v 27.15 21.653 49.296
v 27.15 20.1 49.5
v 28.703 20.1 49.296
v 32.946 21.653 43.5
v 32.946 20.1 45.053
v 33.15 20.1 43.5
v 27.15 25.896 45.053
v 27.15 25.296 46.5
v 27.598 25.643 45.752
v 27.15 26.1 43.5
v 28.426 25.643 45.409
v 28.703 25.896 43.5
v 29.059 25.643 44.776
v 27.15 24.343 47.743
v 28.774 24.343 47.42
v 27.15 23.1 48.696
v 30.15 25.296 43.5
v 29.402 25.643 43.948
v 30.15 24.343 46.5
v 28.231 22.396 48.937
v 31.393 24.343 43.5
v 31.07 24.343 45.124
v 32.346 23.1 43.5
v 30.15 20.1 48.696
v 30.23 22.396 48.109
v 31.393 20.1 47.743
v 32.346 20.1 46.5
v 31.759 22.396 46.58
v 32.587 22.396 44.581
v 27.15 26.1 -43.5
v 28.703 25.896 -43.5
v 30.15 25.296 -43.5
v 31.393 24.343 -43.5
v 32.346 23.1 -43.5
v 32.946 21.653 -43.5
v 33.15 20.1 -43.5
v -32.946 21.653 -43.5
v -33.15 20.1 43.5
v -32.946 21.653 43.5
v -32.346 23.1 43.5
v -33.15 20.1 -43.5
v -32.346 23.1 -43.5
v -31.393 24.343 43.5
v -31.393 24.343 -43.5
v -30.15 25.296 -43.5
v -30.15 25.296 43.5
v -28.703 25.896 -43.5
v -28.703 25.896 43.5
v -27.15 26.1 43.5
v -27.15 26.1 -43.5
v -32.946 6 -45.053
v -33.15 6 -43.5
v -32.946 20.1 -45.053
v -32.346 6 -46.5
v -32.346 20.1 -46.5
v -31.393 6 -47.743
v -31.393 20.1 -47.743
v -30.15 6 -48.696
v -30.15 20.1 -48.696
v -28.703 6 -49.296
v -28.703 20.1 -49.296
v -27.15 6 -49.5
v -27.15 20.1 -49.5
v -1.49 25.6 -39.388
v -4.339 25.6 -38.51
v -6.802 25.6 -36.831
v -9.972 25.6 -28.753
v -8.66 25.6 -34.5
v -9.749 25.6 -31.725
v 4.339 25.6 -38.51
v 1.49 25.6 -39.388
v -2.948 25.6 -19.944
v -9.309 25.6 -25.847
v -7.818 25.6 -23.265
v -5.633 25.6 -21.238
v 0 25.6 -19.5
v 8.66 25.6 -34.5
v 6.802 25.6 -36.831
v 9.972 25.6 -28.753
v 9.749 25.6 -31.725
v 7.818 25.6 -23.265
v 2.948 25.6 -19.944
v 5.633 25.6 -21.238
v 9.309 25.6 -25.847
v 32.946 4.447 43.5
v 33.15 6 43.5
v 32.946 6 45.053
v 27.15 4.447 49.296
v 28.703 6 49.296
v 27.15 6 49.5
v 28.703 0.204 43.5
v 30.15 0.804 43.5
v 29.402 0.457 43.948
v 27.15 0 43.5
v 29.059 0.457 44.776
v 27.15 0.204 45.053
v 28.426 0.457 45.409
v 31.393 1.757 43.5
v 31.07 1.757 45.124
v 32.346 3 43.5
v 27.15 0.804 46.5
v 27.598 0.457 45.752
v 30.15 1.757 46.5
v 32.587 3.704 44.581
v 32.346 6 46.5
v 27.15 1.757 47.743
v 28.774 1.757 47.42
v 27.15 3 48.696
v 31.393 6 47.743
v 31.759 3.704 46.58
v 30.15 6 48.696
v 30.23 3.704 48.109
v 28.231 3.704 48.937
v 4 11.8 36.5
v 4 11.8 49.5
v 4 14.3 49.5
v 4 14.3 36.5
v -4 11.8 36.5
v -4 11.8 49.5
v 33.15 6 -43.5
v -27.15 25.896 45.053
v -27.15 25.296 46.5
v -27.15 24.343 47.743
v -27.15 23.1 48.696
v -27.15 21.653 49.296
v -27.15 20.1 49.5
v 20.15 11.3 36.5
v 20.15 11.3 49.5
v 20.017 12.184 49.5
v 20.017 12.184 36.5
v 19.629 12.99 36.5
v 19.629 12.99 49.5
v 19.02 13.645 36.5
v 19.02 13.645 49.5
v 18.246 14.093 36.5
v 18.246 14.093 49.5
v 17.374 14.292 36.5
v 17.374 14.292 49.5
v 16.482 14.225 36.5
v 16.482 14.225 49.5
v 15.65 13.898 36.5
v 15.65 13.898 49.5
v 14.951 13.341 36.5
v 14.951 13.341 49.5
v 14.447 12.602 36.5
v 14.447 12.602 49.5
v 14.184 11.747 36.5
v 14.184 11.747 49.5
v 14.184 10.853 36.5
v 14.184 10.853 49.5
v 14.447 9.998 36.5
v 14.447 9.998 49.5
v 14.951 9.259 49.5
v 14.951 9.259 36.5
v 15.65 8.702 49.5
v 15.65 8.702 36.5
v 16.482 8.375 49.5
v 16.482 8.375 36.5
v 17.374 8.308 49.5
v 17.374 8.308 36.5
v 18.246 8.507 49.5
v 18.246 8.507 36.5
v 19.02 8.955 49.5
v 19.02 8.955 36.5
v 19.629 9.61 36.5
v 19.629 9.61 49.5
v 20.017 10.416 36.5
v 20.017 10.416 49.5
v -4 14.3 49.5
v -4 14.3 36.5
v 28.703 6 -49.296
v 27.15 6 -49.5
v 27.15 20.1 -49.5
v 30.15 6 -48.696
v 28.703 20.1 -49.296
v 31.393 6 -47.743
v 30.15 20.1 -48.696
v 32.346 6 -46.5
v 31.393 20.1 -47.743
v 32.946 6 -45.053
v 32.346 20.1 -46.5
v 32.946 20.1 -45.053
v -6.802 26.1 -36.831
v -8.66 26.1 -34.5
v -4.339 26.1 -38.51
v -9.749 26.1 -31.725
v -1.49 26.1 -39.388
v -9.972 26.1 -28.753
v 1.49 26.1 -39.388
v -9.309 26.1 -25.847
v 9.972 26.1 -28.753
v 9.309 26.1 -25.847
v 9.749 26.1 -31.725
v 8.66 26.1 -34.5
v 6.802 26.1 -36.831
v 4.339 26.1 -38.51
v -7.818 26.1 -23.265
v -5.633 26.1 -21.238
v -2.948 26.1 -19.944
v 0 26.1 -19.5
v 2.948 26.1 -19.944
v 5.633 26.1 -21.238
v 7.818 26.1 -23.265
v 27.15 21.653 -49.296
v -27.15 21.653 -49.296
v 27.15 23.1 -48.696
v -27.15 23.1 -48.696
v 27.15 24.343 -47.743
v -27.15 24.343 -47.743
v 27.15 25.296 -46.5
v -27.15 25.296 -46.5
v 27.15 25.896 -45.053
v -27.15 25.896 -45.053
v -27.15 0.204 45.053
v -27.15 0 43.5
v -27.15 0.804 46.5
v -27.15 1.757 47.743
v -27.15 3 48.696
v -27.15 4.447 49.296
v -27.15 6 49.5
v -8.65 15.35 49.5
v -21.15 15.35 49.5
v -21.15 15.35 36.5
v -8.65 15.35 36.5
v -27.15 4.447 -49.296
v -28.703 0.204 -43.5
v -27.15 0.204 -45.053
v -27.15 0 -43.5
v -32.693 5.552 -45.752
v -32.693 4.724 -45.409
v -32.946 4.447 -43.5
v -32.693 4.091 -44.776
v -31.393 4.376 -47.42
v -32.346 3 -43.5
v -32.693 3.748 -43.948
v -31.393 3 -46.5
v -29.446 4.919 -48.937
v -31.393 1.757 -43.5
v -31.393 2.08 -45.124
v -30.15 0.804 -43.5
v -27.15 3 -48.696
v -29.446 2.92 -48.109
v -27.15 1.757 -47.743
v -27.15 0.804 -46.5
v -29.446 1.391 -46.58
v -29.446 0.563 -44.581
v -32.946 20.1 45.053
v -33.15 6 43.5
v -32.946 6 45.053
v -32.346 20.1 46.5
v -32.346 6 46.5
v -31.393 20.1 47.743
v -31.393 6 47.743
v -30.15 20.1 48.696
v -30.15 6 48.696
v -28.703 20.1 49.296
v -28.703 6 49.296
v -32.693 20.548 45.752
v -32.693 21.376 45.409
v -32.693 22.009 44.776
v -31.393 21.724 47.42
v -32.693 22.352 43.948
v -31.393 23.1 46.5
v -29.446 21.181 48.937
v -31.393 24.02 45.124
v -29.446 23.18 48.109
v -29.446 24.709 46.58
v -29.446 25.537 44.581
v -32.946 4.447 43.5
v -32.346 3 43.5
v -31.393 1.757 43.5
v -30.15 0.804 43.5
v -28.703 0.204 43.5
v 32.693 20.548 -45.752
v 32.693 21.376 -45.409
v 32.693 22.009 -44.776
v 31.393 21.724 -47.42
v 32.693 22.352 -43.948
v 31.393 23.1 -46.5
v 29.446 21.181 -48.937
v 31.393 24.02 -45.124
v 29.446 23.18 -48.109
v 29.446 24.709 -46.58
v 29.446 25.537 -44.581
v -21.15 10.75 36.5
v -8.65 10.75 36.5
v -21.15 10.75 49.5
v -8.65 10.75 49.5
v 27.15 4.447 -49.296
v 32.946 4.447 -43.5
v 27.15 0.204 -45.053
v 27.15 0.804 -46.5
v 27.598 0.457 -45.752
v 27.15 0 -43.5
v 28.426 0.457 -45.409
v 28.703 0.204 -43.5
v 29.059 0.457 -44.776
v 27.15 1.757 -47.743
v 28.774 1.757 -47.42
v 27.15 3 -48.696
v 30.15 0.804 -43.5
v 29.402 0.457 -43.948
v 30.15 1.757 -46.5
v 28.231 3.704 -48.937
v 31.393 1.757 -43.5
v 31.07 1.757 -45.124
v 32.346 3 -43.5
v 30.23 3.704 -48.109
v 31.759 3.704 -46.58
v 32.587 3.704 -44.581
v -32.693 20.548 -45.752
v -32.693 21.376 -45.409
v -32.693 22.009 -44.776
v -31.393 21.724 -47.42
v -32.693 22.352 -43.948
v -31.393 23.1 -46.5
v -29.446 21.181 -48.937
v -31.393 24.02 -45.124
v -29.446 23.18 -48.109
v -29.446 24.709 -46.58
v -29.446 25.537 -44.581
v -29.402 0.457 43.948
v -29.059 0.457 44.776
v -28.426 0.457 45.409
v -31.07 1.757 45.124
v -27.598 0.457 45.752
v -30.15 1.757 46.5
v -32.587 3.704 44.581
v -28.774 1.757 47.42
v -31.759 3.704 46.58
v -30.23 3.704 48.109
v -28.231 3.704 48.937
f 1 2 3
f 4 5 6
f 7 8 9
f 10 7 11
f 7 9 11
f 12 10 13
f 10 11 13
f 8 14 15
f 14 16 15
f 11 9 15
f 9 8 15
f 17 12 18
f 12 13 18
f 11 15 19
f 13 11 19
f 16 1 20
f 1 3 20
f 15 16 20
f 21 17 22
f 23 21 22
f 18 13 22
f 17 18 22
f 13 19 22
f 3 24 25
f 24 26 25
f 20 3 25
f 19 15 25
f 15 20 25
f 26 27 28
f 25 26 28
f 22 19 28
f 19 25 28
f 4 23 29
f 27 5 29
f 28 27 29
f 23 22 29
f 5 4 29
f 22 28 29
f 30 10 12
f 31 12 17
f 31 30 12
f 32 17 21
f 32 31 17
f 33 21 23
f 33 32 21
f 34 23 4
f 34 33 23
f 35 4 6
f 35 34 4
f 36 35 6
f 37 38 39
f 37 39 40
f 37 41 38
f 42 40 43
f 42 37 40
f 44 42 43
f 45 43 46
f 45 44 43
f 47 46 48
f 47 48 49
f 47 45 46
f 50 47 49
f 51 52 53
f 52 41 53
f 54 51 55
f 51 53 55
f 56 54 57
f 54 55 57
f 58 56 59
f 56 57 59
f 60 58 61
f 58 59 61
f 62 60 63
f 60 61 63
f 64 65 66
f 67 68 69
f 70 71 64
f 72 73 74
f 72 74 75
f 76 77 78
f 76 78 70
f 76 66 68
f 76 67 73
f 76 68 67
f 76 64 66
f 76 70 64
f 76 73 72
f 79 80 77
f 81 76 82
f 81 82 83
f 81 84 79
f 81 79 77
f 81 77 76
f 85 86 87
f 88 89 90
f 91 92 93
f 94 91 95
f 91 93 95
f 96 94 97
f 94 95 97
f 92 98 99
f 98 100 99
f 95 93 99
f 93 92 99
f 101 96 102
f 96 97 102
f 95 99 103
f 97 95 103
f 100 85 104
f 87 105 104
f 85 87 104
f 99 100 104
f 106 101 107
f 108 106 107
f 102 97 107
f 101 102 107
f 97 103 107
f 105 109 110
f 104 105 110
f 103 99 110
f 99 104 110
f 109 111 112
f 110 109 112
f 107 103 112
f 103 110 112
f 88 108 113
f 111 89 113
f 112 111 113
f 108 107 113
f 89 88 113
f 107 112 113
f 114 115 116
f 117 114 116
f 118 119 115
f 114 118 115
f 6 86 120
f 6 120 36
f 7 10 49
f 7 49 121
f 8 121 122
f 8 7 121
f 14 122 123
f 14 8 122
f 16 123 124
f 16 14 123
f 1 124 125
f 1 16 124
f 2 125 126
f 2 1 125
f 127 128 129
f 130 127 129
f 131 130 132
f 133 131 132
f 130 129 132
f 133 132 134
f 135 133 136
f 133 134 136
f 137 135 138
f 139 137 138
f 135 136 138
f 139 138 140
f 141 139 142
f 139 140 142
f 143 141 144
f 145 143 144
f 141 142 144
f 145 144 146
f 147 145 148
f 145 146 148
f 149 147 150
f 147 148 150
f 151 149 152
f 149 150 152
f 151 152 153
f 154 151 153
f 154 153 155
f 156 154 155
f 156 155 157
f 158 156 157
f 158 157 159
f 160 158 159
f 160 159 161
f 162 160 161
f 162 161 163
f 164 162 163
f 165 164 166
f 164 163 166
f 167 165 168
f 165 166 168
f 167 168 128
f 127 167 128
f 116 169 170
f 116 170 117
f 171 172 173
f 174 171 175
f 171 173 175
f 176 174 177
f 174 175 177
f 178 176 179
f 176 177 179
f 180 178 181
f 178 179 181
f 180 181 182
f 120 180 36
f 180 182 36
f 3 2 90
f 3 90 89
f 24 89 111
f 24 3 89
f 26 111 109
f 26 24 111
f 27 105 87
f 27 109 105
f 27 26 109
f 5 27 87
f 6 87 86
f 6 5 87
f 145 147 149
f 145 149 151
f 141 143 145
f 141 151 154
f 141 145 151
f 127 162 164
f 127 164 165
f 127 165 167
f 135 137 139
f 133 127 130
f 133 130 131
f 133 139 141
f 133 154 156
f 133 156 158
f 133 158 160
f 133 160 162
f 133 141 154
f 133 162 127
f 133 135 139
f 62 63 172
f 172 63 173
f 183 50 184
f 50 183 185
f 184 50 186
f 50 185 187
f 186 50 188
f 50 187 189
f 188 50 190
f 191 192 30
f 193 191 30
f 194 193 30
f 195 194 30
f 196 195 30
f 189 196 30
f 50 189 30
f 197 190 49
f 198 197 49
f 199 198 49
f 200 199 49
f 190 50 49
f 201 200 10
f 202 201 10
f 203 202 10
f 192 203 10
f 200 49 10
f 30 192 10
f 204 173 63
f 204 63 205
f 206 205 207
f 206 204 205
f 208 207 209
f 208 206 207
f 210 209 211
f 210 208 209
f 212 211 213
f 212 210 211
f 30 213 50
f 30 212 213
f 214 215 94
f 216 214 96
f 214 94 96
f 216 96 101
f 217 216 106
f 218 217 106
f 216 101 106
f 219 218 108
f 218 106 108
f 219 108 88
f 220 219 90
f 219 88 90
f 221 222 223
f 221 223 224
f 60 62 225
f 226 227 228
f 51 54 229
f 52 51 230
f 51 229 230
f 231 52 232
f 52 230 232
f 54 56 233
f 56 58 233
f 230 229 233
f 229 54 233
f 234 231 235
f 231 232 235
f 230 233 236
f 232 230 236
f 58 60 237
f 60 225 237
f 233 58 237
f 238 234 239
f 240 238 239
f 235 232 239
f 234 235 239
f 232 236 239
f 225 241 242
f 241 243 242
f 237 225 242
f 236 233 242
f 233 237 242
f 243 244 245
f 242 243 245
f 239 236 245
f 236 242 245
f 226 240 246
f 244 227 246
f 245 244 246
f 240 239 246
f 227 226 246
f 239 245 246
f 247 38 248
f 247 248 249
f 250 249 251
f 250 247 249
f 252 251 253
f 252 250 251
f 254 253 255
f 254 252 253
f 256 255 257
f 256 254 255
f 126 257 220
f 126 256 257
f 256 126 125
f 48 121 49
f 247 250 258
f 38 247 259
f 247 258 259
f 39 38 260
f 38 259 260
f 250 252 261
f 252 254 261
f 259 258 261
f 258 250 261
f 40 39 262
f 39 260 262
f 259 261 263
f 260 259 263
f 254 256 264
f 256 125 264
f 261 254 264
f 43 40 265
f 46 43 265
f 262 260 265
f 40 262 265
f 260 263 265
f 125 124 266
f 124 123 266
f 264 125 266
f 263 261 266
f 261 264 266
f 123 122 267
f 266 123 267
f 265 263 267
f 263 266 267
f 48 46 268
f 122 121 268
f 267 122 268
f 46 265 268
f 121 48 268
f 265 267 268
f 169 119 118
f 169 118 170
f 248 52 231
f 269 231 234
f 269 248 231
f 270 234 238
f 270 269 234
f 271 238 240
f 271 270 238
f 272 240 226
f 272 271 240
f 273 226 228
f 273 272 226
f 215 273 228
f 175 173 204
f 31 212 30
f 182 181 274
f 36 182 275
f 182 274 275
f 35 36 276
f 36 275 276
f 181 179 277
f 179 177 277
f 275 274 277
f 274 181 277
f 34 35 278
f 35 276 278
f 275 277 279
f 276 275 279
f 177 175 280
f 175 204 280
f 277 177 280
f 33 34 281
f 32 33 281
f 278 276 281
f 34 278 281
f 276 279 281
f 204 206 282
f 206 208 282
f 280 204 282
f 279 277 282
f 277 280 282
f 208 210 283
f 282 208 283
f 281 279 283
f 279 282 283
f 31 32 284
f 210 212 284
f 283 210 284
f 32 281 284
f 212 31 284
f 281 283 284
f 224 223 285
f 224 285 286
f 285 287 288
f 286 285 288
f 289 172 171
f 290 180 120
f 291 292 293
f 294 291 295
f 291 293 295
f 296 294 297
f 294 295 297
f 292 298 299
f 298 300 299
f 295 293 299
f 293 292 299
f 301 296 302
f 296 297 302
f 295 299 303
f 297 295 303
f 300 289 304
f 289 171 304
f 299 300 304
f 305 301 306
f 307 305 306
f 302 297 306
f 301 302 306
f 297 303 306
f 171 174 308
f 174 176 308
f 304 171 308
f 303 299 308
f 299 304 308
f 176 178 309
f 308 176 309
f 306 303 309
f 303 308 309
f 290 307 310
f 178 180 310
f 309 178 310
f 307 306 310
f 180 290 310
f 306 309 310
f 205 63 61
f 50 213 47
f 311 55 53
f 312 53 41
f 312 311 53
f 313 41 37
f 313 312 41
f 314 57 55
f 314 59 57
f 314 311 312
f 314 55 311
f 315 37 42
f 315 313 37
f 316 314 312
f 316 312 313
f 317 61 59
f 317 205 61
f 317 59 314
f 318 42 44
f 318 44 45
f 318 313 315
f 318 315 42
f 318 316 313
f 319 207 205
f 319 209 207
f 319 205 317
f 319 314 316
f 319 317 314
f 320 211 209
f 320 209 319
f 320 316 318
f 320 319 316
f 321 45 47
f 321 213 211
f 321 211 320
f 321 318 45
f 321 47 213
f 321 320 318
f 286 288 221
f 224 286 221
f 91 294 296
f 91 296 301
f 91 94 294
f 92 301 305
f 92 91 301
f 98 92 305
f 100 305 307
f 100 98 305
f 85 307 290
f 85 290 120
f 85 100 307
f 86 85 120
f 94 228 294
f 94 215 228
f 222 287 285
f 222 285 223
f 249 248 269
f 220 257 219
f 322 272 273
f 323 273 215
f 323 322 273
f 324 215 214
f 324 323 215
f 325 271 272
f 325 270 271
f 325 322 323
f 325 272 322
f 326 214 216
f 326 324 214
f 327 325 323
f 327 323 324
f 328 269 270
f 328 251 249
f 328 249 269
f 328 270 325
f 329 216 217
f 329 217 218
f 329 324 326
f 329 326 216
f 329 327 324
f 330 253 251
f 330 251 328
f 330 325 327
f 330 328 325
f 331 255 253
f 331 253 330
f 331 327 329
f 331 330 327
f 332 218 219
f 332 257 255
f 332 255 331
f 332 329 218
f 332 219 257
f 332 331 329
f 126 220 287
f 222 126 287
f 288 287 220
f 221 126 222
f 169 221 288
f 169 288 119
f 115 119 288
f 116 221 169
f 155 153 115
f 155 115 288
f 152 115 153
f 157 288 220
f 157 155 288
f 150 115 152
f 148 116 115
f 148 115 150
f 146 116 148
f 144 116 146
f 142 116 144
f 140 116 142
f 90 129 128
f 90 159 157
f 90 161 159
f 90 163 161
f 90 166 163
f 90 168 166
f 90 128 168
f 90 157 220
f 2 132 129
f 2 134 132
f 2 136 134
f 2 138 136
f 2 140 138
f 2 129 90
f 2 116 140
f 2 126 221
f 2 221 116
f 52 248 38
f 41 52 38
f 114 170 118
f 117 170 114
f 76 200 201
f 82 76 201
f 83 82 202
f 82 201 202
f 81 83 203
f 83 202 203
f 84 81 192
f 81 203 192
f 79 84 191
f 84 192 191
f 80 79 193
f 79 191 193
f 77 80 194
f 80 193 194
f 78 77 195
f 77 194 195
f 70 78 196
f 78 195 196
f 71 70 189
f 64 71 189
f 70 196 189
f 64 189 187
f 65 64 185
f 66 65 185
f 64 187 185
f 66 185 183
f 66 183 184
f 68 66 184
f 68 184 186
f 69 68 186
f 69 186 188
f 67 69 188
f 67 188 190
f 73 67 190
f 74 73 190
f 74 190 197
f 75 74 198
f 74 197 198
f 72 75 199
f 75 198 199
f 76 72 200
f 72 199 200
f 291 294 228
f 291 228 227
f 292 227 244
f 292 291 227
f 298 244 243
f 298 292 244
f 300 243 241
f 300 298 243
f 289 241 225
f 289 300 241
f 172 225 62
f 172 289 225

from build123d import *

# Parameters (mm, degrees)
SKETCH1_W           = 66.3
SKETCH1_H           = 26.1
BOSS_EXTRUDE1_DEPTH = 49.5
SKETCH2_R           = 3
SKETCH2_W           = 12.5
SKETCH2_H           = 4.6
SKETCH2_W_2         = 8
SKETCH2_H_2         = 2.5
CONNECTORS_DEPTH    = 13
SKETCH4_R           = 10
DISPLAY_DEPTH       = 0.5
FILLET1_R           = 6


with BuildPart() as part:
    # Sketch1 → Boss-Extrude1 (new, symmetric)
    with BuildSketch(Plane.XY):
        with Locations((0, 13.05)):
            Rectangle(SKETCH1_W, SKETCH1_H)
    extrude(amount=BOSS_EXTRUDE1_DEPTH, both=True)

    # Sketch2 → connectors (cut)
    with BuildSketch(Plane.XY.offset(49.5)):
        with Locations((17.15, 11.3)):
            Circle(SKETCH2_R)
        with Locations((-14.9, 13.05)):
            Rectangle(SKETCH2_W, SKETCH2_H)
        with Locations((0, 13.05)):
            Rectangle(SKETCH2_W_2, SKETCH2_H_2)
    extrude(amount=-CONNECTORS_DEPTH, mode=Mode.SUBTRACT)

    # Sketch4 → display (cut)
    with BuildSketch(Plane(origin=(0, 26.1, 0), x_dir=(1, 0, 0), z_dir=(0, 1, 0))):
        with Locations(Location((0, 29.5, 0), (0, 0, 270))):
            Circle(SKETCH4_R)
    extrude(amount=-DISPLAY_DEPTH, mode=Mode.SUBTRACT)

    # Fillet1
    fillet1_edges = [part.edges().sort_by_distance(p)[0] for p in [
        (33.15, 13.05, 49.5),
        (0, 26.1, 49.5),
        (-33.15, 13.05, 49.5),
        (0, 26.1, -49.5),
        (33.15, 13.05, -49.5),
        (0, 0, -49.5),
        (-33.15, 13.05, -49.5),
        (-33.15, 26.1, 0),
        (33.15, 26.1, 0),
        (33.15, 0, 0),
        (-33.15, 0, 0),
        (0, 0, 49.5),
    ]]
    fillet(fillet1_edges, radius=FILLET1_R)


solid = part.part
